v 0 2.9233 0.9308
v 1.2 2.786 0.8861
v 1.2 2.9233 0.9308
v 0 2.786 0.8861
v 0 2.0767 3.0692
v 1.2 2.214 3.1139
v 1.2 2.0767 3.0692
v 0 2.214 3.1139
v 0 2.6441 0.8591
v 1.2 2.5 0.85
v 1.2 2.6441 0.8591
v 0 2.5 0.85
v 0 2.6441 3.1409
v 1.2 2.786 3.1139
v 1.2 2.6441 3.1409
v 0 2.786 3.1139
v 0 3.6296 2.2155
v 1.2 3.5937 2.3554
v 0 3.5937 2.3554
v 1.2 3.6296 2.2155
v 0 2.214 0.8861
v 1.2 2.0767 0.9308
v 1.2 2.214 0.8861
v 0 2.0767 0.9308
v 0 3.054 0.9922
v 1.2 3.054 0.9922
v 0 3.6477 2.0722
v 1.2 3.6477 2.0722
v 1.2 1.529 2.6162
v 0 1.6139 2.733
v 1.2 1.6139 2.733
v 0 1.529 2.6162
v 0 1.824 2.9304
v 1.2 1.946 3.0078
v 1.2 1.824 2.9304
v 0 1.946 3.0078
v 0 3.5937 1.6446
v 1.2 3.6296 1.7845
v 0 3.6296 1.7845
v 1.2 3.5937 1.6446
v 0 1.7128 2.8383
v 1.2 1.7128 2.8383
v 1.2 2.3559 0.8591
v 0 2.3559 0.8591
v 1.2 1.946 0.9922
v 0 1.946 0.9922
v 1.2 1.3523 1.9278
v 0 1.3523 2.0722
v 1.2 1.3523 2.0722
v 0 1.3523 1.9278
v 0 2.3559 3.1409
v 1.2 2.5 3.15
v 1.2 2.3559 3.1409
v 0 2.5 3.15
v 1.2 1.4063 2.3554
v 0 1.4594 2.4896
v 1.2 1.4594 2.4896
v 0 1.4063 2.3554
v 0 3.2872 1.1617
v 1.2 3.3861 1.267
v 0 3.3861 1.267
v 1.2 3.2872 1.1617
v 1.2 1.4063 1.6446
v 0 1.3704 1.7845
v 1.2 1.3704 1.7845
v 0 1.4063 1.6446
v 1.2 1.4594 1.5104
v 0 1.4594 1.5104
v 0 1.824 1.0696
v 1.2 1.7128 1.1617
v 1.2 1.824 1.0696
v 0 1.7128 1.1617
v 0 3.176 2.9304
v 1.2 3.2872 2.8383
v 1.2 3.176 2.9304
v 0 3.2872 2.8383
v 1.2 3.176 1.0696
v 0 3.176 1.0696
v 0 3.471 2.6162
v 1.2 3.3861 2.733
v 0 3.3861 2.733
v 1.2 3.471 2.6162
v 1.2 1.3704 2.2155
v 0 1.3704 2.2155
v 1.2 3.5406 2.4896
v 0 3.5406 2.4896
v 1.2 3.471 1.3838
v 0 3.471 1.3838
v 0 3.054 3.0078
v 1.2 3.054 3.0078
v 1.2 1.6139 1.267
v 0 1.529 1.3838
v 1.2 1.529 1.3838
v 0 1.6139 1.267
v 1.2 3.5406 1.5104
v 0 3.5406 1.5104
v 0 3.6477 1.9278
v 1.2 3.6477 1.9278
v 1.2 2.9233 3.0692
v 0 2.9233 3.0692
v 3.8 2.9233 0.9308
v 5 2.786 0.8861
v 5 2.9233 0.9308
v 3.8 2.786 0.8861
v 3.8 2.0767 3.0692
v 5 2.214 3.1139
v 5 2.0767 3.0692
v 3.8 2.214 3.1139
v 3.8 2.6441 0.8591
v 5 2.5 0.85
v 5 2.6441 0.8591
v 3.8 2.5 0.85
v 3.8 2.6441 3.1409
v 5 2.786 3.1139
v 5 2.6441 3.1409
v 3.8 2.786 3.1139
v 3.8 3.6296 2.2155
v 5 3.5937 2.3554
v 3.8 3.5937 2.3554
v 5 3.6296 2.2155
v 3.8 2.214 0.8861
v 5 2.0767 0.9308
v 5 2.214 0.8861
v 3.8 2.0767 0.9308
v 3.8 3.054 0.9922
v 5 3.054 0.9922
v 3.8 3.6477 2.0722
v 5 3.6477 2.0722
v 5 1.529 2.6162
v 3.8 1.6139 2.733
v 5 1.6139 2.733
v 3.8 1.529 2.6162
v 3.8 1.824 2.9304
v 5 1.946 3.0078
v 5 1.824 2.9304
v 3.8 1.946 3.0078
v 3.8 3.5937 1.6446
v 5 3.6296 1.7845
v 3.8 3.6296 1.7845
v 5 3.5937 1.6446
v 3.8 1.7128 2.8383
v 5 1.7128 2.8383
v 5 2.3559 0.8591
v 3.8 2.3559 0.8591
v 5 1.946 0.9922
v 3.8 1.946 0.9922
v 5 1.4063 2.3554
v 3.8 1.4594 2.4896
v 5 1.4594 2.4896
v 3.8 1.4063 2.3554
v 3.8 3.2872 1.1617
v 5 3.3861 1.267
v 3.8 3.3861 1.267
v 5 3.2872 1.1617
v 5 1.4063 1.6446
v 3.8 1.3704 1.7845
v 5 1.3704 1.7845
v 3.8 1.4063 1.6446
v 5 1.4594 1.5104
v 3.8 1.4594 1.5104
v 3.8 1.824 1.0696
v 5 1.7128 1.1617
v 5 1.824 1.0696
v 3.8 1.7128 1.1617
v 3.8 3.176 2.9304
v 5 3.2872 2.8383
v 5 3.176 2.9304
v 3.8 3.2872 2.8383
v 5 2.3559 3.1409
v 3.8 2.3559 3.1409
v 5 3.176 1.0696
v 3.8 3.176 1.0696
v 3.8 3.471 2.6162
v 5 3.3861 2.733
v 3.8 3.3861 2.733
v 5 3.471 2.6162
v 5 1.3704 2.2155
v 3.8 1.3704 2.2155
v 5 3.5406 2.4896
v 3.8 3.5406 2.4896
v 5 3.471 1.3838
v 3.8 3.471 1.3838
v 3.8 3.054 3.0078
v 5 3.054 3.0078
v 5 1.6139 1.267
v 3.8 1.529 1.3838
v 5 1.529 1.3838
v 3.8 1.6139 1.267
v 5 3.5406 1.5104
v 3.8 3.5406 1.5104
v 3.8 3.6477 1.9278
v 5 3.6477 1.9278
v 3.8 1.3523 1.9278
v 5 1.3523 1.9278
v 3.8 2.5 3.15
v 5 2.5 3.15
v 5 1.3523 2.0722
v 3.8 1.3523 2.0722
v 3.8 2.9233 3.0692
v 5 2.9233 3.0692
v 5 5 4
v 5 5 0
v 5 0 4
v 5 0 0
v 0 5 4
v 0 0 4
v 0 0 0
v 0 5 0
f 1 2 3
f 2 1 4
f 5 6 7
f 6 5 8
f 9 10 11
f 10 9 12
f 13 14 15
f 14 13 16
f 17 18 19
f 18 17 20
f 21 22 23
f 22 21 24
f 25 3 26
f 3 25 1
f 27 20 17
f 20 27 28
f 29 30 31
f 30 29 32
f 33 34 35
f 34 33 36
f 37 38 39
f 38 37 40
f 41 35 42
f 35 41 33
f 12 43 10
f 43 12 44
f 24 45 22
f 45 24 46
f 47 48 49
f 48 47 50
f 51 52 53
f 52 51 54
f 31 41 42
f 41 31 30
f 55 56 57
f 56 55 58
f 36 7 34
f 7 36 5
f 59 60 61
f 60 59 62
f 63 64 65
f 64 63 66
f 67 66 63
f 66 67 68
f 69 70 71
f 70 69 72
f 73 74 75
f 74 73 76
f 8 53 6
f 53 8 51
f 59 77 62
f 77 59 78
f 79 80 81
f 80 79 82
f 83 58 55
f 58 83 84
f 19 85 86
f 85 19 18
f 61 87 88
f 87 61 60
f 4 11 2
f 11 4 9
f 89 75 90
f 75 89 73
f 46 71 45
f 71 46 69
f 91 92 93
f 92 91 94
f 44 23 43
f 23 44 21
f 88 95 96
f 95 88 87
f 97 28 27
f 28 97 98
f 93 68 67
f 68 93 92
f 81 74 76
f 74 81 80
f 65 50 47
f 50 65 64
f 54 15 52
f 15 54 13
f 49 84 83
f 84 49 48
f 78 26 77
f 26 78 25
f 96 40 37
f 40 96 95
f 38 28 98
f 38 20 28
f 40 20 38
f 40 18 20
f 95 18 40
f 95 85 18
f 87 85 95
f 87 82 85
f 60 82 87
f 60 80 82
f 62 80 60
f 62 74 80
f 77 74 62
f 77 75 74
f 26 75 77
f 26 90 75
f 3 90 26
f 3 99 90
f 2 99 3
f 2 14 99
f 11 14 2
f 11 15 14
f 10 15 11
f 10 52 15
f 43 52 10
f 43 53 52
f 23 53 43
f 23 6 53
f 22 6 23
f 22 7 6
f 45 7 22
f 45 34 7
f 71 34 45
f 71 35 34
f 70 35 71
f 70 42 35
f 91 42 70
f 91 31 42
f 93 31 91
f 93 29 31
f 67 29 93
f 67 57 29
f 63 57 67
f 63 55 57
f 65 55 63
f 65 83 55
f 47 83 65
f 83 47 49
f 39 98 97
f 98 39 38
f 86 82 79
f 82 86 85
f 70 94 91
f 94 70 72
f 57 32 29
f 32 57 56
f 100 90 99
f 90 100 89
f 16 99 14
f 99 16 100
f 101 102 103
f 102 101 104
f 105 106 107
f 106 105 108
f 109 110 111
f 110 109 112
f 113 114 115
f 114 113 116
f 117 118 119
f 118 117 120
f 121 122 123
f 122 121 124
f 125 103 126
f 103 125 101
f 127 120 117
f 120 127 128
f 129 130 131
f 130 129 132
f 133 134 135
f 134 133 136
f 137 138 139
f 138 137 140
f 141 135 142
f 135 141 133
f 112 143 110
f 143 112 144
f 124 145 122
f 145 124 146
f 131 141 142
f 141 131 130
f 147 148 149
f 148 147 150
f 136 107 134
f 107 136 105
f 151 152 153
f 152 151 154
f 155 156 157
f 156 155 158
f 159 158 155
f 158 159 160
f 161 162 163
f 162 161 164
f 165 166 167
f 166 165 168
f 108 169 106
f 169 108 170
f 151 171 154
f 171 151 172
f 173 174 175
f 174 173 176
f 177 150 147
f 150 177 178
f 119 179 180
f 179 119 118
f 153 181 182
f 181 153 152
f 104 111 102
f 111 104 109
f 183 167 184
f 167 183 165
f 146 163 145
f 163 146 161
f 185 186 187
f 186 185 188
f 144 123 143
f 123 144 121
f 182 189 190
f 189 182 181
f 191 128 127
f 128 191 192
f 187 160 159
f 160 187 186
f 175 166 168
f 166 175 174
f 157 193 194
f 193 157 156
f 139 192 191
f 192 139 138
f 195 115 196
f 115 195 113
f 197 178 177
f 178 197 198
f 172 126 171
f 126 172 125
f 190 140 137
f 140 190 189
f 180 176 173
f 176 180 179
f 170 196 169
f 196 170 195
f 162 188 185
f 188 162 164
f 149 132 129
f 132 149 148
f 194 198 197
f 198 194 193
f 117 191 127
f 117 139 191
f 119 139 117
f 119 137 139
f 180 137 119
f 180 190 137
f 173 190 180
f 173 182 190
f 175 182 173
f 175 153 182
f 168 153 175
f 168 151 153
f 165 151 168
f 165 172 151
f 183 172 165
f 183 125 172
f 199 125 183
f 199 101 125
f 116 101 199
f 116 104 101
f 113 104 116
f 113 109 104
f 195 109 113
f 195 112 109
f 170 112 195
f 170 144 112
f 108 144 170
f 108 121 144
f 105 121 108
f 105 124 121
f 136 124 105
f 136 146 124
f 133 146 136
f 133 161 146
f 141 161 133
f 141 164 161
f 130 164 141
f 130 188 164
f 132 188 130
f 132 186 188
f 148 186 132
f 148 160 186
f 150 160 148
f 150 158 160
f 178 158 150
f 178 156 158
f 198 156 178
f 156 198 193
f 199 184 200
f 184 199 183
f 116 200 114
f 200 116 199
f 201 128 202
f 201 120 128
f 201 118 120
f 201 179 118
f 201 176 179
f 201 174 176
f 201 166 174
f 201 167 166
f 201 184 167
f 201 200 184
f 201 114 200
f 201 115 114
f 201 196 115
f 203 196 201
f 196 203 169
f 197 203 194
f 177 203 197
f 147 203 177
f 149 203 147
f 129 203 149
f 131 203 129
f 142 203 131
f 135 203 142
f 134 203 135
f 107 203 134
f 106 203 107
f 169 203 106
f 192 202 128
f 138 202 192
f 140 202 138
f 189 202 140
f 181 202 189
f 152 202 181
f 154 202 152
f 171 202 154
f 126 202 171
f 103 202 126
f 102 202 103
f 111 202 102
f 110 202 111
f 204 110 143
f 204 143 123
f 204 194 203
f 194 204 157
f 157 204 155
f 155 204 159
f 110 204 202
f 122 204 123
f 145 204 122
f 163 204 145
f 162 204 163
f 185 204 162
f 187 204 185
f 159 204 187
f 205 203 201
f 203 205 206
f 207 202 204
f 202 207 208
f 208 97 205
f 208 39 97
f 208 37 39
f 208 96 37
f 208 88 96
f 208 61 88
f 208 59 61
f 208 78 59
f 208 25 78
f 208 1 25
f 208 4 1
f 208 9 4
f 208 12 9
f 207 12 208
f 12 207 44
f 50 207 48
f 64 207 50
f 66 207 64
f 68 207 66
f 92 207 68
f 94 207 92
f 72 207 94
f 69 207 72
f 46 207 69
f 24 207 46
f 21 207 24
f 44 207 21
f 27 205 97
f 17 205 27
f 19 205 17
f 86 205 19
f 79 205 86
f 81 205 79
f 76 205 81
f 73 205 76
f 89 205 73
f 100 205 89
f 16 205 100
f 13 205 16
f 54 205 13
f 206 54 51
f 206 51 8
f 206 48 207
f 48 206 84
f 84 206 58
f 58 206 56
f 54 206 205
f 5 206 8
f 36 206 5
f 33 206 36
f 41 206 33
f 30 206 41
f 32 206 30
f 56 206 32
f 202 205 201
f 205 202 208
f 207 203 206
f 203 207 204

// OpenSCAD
// file: ../../lib/util/util_functions.scad
include <../config/constants.scad>

function sum(v) = [for(p = v) 1] * v;

function take_sum(v, i) = i == 0 
  ? 0 
  : sum([for(a=[0:i-1]) v[a]]);

// input : nested list
// output : list with the outer level nesting removed
function flatten(outter_vector) = [for(inner_vector=outter_vector) for(item=inner_vector) item];
// file: ../../lib/config/constants.scad
// Shared constants reflect things that are true for the whole model not just a single component.
// They should by definition be required by multiple components.
$fn = 10;

$abs_filament = false;

$wall_thickness = 2;
$floor_thickness = 2;
$wall_rect = [$wall_thickness, $wall_thickness];
$wall_cube = [$wall_thickness, $wall_thickness, $wall_thickness];
$inner_wall_thickness = 1;

$bleed = 0.01;

$padding = 0.5;
$top_padding = 0.2;
$padding_rect = [$padding * 2, $padding * 2];

$card_padding = 1.5;

$floor_cutout_threshold = 50;

$inset = 6;
$cutout_fraction = 0.6;

$rounding = 3;

$lid_height = 2;

$trapezoid_inset = 1;
// file: ../../lib/layout/layout.scad
include <../config/constants.scad>
include <../util/util_functions.scad>

function padded_rect(size) = size + (
  size[2] == undef
    ? [$padding * 2, $padding * 2]
    : [$padding * 2, $padding * 2, 0]
);

function padded_cube(size) = size + [$padding * 2, $padding * 2, $padding * 2];

function stack_height (length, count=1, top_padding=$top_padding) = length * count + top_padding;

function padded_offset (length, index=1) = (length + $padding * 2 + $wall_thickness) * index;

function offset (size, index=1) = (size + $wall_thickness) * index;

function pad(length) = length + $padding * 2;

function padded_list_length(list) = sum(
  [for(i=[0:len(list)-1]) list[i] + $padding * 2 + $wall_thickness]
) + $wall_thickness;

function divide_rect(rect, operand) = rect[2] == undef
  ? [rect[0] / operand, rect[1] / operand]
  : [rect[0] / operand, rect[1] / operand, rect[2]];

function multiply_rect(rect, operand) = [rect[0] * operand, rect[1] * operand];

function divide_cube(rect, operand) = [rect[0] / operand, rect[1] / operand, rec[2] / operand];
function multiply_cube(rect, operand) = [rect[0] * operand, rect[1] * operand, rect[2] * operand];

function offset_centre_in_box(size, bounding_box) = divide_rect(bounding_box - size, 2);

function spin_orientation_size(size, orientation=1) = orientation % 2 == 0
  ? size
  : [
    size[1],
    size[0],
    size[2],
  ];

// TODO add support for orientation 3
function spin_orientation_offset(size, orientation=1) = [
  orientation == 2 ? -size[0]: 0,
  orientation == 1 ? -size[0]: (orientation == 2 ? -size[1]: 0),
  0,
];

module spin_orientation(size, orientation=1) {
  assert(orientation >= 0, "Invalid orientation [0, 1, 2, 3] required");
  assert(orientation < 3, "Invalid orientation [0, 1, 2, 3] required");

  rotated_size = spin_orientation_size(size, orientation=1);
  degrees = 90 * orientation;
  spin_offset = spin_orientation_offset(size, orientation);

  rotate([0, 0, 90 * orientation]) {
    translate(spin_offset) {
      children();
    }
  }
}

module offset_cylinder(d, h) {
  translate([d / 2, d / 2, 0]) {
    cylinder(d=d, h=h);
  }
}

module offset_circle(d) {
  translate([d / 2, d / 2, 0]) {
    circle(d=d);
  }
}

module offset_square(size, center=false) {
  translate([size[0] / 2, size[1] / 2, 0]) {
    square(size, center=center);
  }
}
// file: ../../lib/config/magnet-sizes.scad
magnet_diameter_tolerance = 0.3;
magnet_height_tolerance = 0.2;

small_magnet_diameter = 2;
small_magnet_height = 1;
// file: ../../lib/magnet/magnet.scad
include <../layout/layout.scad>
include <../config/magnet-sizes.scad>

function magnet_cutout_diameter(diameter) = diameter + magnet_diameter_tolerance;

function magnet_cutout_height(height) = height + magnet_height_tolerance;

module vertical_magnet_cutout (diameter, height) {
  _diameter = magnet_cutout_diameter(diameter);
  _height = magnet_cutout_height(height);

  translate([0, _diameter/2, _diameter/2]) {
    rotate([0, 90, 0]) {
      cylinder(d=_diameter, h=_height);
    }
  }
}

function translation_left(box_size, diameter, height, floor_compensation = 0) = [
  -$bleed,
  (box_size[1] - magnet_cutout_diameter(diameter)) / 2,
  (box_size[2] - floor_compensation - magnet_cutout_diameter(diameter)) / 2 + floor_compensation,
];

function translation_right(box_size, diameter, height, floor_compensation = 0) = [
  box_size[0] - magnet_cutout_height(height) + $bleed,
  (box_size[1] - magnet_cutout_diameter(diameter)) / 2,
  (box_size[2] - floor_compensation - magnet_cutout_diameter(diameter)) / 2 + floor_compensation,
];

module vertical_magnet_sockets(
  box_size,
  diameter,
  height,
  positions=["left"],
  floor_compensation = 0
) {
  for(i=[0:len(positions)-1]) {
    let (position=positions[i]) {
      vertical_magnet_socket(box_size, diameter, height, position, floor_compensation);
    }
  }
};

module vertical_magnet_socket(
  box_size,
  diameter,
  height,
  position="left",
  floor_compensation = 0
) {
  assert(position == "left" || position == "right", "valid positions: (left | right)");

  _height = height + $bleed;

  translation = position == "left"
    ? translation_left(box_size, diameter, _height, floor_compensation)
    : translation_right(box_size, diameter, _height, floor_compensation);

  translate(translation) {
    vertical_magnet_cutout(diameter, _height);
  }
}
// main file
include <../../lib/magnet/magnet.scad>
include <../../lib/config/magnet-sizes.scad>

$fn = 50;

size = [5, 5, 4];

difference() {
  cube(size);

  vertical_magnet_sockets(
    size,
    small_magnet_diameter,
    small_magnet_height,
    ["left", "right"]
  );
}
